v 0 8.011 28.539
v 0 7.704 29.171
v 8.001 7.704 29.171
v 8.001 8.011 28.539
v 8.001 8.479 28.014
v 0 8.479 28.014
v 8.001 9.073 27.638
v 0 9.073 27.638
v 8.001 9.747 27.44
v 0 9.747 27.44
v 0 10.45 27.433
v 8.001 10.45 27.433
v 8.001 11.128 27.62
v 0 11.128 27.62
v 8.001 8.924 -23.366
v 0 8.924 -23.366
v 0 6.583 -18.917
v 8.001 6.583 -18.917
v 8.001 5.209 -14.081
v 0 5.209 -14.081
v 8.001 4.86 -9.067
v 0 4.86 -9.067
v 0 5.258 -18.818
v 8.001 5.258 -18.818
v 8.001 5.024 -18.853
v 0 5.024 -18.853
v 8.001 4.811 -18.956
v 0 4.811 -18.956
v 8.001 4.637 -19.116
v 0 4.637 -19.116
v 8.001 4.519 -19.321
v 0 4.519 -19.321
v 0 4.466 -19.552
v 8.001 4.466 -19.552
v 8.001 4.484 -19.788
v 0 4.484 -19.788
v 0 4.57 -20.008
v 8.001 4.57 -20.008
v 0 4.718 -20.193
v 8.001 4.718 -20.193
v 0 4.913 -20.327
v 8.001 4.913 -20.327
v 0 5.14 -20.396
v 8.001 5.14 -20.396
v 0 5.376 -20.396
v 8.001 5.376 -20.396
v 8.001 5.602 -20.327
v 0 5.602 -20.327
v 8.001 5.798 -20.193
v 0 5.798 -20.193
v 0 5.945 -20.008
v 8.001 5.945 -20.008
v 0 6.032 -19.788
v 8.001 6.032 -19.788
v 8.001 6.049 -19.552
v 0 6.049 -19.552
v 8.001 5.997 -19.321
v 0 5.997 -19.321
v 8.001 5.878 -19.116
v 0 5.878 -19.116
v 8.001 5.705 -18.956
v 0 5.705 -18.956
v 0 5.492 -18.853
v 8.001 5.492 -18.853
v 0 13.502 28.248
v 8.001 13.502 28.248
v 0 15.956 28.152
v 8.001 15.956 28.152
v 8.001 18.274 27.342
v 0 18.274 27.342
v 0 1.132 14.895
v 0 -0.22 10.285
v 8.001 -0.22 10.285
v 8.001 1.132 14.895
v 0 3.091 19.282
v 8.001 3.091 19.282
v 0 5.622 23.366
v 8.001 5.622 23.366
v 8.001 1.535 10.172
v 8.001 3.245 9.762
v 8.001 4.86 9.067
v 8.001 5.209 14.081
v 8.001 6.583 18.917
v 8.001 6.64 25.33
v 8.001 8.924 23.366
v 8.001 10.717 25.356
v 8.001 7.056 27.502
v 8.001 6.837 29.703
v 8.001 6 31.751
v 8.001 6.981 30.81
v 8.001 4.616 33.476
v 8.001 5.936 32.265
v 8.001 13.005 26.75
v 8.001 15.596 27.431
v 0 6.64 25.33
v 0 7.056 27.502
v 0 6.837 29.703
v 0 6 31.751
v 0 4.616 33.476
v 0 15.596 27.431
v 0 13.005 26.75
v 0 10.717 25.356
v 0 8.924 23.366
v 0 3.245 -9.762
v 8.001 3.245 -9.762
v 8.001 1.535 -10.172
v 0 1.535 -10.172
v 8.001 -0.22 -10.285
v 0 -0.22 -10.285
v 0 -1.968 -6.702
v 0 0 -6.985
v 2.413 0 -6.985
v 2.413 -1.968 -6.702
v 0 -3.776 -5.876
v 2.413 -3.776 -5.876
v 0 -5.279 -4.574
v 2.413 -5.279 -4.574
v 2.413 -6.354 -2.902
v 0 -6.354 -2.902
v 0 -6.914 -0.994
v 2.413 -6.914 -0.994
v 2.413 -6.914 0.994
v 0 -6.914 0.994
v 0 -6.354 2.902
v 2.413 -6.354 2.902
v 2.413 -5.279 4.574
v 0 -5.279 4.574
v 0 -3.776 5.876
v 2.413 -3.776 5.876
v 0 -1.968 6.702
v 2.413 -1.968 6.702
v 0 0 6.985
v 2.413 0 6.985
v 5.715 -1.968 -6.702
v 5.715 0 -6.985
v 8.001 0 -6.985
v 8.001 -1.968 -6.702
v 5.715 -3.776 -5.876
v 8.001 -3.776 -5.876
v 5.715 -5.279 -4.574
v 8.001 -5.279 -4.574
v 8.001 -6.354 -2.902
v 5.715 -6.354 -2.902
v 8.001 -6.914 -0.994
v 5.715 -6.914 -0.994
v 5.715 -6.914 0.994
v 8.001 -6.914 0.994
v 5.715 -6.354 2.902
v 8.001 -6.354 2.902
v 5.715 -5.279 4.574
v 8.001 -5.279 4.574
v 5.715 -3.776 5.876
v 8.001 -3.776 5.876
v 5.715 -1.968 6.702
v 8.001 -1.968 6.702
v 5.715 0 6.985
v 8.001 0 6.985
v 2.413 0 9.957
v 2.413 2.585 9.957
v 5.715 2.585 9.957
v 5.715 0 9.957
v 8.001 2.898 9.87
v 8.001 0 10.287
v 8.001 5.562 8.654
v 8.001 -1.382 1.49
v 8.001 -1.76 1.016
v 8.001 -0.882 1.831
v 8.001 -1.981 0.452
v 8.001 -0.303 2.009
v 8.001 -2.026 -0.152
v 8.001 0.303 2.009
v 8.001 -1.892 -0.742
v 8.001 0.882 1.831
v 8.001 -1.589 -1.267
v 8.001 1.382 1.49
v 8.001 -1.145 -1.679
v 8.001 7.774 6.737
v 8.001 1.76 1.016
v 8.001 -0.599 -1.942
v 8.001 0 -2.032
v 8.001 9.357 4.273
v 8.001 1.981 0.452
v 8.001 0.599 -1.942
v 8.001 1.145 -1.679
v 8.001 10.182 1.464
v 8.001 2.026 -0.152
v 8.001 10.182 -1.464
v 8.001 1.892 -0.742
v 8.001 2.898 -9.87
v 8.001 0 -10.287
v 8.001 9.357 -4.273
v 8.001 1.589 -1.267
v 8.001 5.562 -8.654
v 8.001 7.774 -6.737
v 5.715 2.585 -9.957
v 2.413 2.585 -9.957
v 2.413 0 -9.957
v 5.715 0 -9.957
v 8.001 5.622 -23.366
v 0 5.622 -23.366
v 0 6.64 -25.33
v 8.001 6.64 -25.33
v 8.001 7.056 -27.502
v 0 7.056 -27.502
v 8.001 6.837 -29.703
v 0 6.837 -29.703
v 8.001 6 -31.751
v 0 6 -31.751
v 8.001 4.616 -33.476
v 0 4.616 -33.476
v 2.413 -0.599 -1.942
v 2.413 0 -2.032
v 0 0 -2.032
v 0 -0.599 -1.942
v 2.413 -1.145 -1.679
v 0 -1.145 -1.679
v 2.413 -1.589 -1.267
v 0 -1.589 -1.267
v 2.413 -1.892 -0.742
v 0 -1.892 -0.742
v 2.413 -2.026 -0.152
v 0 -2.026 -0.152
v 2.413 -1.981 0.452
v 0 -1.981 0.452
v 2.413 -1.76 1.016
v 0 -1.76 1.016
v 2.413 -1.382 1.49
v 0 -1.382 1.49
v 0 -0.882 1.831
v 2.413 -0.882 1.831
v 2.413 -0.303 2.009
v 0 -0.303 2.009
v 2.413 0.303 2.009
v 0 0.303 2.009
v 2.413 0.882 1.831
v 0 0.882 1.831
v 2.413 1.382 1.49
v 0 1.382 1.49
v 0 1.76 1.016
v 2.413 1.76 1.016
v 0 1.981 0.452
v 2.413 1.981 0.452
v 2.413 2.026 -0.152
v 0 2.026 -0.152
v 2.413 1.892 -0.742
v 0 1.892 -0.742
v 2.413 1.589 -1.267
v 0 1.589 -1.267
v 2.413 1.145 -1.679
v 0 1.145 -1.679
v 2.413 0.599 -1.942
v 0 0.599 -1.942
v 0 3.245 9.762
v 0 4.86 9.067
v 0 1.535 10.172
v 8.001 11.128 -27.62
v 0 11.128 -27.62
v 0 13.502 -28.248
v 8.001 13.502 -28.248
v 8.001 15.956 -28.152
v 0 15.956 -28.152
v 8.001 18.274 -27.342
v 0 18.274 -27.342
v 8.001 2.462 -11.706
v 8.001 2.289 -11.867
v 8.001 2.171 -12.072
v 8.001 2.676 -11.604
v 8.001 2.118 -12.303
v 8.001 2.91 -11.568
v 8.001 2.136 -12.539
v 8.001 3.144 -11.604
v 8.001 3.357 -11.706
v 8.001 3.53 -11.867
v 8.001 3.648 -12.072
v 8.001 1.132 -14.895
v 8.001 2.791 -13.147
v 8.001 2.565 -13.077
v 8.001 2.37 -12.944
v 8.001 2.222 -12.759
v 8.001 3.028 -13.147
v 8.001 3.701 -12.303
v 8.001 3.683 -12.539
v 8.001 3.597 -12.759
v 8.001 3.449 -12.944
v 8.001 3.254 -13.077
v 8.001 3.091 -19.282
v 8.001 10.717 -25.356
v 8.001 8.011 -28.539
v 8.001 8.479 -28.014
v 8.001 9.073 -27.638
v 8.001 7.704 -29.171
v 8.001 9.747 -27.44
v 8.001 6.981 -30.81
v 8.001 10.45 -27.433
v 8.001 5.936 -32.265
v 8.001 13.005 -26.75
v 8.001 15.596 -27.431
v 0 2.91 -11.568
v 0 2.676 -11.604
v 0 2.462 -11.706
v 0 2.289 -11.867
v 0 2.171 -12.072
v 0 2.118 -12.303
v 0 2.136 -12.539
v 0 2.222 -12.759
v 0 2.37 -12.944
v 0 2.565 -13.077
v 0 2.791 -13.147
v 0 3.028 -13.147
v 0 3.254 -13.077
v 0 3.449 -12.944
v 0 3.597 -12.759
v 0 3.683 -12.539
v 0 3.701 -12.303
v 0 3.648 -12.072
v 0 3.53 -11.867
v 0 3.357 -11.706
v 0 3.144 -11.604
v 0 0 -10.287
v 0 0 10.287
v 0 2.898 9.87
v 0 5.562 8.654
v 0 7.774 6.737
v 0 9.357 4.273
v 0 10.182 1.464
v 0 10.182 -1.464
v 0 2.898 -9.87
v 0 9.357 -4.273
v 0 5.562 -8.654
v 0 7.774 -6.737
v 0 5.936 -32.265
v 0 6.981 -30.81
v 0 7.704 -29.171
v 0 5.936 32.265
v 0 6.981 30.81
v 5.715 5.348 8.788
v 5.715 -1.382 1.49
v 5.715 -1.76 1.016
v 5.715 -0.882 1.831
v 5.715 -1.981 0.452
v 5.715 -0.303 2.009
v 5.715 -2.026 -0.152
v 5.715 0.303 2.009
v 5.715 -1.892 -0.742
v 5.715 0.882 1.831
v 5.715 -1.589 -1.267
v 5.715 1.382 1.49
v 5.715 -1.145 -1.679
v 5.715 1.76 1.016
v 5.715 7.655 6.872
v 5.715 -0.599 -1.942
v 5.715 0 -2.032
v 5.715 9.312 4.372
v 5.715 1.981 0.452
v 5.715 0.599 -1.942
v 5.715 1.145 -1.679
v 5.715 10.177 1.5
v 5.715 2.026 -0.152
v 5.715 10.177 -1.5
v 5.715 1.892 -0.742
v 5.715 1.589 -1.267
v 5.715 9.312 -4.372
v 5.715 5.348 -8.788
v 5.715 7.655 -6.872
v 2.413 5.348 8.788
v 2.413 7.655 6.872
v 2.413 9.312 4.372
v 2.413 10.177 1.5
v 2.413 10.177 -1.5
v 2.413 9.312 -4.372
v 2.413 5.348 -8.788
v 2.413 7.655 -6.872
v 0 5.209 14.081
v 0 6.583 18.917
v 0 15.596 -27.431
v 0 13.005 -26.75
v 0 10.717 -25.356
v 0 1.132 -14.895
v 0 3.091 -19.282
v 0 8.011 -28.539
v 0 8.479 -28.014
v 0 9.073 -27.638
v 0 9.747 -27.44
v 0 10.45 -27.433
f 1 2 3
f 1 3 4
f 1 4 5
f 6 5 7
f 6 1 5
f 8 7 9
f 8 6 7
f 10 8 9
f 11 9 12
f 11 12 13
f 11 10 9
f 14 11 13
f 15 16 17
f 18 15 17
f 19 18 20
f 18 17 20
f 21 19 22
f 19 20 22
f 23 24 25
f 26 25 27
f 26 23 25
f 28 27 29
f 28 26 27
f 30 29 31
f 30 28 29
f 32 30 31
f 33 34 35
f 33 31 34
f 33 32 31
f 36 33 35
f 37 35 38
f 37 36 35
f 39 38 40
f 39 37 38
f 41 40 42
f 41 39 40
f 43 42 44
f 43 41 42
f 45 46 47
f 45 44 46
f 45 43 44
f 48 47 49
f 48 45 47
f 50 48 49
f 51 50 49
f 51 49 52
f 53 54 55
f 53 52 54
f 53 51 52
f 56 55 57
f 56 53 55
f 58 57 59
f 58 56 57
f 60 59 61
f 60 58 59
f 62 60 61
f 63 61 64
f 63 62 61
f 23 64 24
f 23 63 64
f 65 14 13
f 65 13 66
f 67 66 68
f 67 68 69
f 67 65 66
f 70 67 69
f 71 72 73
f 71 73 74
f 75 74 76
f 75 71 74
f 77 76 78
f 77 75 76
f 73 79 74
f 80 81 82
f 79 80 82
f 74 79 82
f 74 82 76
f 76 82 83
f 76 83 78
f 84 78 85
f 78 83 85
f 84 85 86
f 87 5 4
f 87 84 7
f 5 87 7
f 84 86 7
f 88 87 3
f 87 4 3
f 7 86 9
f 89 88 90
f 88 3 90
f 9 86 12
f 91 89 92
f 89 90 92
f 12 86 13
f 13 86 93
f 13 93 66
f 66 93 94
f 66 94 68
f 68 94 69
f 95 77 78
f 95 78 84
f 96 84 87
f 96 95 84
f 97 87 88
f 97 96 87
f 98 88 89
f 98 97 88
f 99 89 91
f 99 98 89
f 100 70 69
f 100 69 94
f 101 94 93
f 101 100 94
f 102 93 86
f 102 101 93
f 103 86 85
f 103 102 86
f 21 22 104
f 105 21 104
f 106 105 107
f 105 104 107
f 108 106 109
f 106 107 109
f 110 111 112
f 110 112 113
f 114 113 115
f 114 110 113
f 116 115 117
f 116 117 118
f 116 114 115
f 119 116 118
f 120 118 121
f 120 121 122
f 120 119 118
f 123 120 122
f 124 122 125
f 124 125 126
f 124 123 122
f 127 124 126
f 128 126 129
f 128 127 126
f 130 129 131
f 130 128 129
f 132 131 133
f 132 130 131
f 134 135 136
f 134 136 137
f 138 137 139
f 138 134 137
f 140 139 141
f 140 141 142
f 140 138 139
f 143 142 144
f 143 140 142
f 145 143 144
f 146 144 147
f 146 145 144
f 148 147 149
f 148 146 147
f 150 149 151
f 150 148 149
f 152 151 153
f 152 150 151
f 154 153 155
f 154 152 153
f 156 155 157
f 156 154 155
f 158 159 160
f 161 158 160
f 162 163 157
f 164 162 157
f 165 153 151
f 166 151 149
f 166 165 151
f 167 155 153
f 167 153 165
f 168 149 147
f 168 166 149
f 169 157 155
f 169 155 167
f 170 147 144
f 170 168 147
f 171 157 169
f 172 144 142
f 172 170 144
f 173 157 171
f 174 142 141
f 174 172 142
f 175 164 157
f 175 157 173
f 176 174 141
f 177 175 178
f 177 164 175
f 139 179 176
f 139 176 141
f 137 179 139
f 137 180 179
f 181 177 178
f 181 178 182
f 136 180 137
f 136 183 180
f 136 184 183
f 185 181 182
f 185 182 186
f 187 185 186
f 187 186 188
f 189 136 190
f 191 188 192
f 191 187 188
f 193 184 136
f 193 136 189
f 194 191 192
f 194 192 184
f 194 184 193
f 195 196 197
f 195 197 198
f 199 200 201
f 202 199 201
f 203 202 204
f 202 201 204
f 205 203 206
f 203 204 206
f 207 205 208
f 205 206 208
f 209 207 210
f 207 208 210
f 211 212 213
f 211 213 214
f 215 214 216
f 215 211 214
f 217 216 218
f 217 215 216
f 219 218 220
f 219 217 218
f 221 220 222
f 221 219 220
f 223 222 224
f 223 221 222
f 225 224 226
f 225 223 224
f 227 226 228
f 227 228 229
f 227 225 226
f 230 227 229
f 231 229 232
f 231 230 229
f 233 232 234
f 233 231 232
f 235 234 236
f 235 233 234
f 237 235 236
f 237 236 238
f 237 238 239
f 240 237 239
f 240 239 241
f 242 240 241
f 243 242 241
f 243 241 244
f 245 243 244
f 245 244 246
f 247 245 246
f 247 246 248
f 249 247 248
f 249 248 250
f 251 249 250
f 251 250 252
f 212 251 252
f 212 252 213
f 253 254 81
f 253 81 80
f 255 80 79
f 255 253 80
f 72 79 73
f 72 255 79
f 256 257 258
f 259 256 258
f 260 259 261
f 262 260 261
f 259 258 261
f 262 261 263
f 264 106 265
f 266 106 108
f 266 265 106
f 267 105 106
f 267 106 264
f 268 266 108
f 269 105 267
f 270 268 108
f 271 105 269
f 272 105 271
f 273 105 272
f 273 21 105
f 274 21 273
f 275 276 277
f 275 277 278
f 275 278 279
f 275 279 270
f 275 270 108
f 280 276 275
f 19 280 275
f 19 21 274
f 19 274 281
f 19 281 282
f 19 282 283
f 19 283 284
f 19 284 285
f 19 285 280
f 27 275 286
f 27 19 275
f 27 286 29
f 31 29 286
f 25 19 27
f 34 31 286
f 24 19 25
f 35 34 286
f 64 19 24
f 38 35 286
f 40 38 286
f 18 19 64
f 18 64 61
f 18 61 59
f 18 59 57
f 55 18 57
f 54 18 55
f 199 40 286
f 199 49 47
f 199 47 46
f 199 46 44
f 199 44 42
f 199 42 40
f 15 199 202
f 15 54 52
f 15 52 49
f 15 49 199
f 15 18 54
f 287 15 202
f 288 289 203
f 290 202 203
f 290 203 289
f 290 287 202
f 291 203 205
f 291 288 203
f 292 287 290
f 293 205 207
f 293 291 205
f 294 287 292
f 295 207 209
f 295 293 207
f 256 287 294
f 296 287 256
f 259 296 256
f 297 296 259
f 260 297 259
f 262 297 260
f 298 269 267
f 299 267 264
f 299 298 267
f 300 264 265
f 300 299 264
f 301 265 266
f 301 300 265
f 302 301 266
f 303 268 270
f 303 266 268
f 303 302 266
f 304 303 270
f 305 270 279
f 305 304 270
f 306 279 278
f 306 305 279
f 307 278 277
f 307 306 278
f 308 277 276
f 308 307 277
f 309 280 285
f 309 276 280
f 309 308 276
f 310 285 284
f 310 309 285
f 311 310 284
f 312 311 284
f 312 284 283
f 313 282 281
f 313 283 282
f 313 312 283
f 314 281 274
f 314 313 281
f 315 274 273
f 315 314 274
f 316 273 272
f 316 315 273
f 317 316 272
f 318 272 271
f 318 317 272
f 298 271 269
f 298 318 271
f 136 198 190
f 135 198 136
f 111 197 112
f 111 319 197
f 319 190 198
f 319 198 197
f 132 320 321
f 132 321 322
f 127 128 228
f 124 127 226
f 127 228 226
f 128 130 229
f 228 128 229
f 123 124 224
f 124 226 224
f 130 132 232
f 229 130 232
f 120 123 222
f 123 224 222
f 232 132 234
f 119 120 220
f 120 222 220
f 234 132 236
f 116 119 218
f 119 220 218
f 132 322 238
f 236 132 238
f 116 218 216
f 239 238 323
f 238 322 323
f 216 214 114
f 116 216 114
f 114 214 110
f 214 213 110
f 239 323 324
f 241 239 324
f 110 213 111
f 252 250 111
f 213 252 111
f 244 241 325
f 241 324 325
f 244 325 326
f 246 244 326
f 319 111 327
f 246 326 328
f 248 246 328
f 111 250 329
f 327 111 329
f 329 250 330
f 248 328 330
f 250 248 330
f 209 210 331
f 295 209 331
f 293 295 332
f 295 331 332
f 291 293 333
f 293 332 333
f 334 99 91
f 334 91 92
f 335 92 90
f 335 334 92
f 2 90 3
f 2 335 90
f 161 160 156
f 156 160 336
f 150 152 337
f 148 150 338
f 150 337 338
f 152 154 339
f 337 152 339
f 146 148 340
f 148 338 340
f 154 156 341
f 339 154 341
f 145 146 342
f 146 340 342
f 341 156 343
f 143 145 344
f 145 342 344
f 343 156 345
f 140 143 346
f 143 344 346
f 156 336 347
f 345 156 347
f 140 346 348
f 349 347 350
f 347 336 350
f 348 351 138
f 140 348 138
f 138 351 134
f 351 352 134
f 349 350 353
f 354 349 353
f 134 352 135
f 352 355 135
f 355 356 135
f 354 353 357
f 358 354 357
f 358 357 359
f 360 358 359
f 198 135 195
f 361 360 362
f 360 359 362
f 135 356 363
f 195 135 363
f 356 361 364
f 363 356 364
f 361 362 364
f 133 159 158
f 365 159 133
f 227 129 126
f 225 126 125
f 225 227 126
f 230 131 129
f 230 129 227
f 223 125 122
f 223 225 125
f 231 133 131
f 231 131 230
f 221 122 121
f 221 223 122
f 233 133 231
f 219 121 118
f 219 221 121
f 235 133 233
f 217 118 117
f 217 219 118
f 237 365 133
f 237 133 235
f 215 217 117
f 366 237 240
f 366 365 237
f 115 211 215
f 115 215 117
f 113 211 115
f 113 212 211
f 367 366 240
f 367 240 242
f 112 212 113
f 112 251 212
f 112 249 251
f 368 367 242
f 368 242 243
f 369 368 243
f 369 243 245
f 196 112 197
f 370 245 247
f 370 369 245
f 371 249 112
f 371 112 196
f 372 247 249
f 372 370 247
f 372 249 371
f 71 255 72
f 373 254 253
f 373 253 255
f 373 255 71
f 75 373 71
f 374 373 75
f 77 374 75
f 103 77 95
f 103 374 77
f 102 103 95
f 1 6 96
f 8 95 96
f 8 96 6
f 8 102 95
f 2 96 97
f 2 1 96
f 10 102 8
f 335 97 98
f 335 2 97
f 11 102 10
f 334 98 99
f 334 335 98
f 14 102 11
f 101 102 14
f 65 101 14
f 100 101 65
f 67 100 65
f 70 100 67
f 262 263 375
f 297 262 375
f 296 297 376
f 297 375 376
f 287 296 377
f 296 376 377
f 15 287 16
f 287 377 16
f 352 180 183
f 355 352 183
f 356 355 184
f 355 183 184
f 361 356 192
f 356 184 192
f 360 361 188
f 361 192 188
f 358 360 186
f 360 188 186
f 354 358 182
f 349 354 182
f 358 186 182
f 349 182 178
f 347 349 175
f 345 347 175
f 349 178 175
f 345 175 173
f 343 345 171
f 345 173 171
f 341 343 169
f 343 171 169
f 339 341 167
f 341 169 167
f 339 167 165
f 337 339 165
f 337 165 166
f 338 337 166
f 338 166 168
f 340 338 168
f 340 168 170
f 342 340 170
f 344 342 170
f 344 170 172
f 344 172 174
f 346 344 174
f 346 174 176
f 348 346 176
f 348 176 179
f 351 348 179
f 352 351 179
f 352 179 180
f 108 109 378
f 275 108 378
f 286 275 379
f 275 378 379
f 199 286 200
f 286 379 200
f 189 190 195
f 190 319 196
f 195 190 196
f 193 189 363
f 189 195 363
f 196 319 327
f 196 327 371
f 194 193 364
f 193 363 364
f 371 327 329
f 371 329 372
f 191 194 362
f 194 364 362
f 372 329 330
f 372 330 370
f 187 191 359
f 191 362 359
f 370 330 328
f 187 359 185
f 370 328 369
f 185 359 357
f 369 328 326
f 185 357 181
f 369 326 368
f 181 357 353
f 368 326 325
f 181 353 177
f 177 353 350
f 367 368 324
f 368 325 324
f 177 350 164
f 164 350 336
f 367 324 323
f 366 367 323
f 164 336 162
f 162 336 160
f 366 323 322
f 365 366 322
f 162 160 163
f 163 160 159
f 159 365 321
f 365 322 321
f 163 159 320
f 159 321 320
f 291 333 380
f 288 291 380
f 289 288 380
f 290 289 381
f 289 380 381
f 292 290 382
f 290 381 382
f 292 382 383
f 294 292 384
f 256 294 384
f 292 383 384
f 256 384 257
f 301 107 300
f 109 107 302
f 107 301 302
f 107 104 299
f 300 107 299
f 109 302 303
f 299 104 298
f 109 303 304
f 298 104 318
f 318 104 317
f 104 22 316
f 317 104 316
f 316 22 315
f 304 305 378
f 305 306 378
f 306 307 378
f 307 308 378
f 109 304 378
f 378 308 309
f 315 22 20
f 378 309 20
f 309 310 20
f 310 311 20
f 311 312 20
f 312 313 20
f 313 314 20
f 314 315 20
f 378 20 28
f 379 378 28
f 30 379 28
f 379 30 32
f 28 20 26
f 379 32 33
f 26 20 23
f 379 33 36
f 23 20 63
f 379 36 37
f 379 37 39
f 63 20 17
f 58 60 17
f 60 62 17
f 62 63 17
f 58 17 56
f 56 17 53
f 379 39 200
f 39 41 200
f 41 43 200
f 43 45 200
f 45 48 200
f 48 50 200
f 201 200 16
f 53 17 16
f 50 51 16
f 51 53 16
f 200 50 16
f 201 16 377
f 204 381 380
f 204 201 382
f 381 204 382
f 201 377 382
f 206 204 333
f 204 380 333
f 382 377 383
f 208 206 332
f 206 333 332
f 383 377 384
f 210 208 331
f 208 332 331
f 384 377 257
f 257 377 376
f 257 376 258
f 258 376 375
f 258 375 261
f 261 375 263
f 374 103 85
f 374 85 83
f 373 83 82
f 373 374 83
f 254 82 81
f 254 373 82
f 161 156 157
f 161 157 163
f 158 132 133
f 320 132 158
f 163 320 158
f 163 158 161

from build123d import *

# Parameters (mm, degrees)
SKETCH1_R                               = 10.287
BOSS_EXTRUDE1_DEPTH                     = 8.001
SKETCH2_R                               = 2.032
CUT_EXTRUDE1_DEPTH                      = 3.7338
CUT_EXTRUDE2_START                      = -3.7338
SKETCH3_R                               = 2.032
CUT_EXTRUDE2_DEPTH                      = 3.7338
BOSS_EXTRUDE2_DEPTH                     = 8.001
CUT_EXTRUDE3_START                      = -8.001
CUT_EXTRUDE3_DEPTH                      = 8.001
SKETCH6_W                               = 3.302
SKETCH6_H                               = 19.9136
CUT_EXTRUDE4_DEPTH                      = 39.509209906
F_1_16_0_0625_DIAMETER_HOLE1_AT_2_COUNT = 2
F_1_16_0_0625_DIAMETER_HOLE1_AT_2_PITCH = 7.62


with BuildPart() as part:
    # Sketch1 → Boss-Extrude1 (new body)
    with BuildSketch(Plane(origin=(0, 0, 0), x_dir=(0, 0, -1), z_dir=(1, 0, 0))):
        Circle(SKETCH1_R)
    extrude(amount=BOSS_EXTRUDE1_DEPTH)

    # Sketch2 → Cut-Extrude1 (cut)
    with BuildSketch(Plane(origin=(8.001, 0, 0), x_dir=(0, 0, -1), z_dir=(1, 0, 0))):
        Circle(SKETCH2_R)
    extrude(amount=-CUT_EXTRUDE1_DEPTH, mode=Mode.SUBTRACT)

    # Sketch3 → Cut-Extrude2 (cut)
    with BuildSketch(Plane.ZY.offset(CUT_EXTRUDE2_START)):
        with Locations(Location((0, 0, 0), (0, 0, 180))):
            Circle(SKETCH3_R)
    extrude(amount=CUT_EXTRUDE2_DEPTH, mode=Mode.SUBTRACT)

    # Sketch5 → Cut-Extrude3 (cut)
    with BuildSketch(Plane(origin=(8.001, 0, 0), x_dir=(0, 0, -1), z_dir=(1, 0, 0)).offset(CUT_EXTRUDE3_START)):
        with BuildLine():
            Line((-6.985, 0), (-10.287, 0))
            ThreePointArc((-10.287, 0), (0, -10.287), (10.287, 0))
            Line((10.287, 0), (6.985, 0))
            ThreePointArc((6.985, 0), (0, -6.985), (-6.985, 0))
        make_face()
    extrude(amount=CUT_EXTRUDE3_DEPTH, mode=Mode.SUBTRACT)

    # Sketch6 → Cut-Extrude4 (cut, through all)
    with BuildSketch(Plane(origin=(0, 10.287, 0), x_dir=(1, 0, 0), z_dir=(0, 1, 0))):
        with Locations((4.064, 0)):
            Rectangle(SKETCH6_W, SKETCH6_H)
    extrude(amount=-CUT_EXTRUDE4_DEPTH, mode=Mode.SUBTRACT)


with BuildPart() as body_2:
    # Sketch4 → Boss-Extrude2 (new body)
    with BuildSketch(Plane.ZY):
        with BuildLine():
            ThreePointArc((9.066535783, 4.860071799), (10.003433712, 2.398683591), (10.284648783, -0.219928201))
            ThreePointArc((10.284648783, -0.219928201), (17.121583704, 2.037315344), (23.365648783, 5.622071799))
            ThreePointArc((23.365648783, 5.622071799), (28.610506662, 7.025976389), (33.475681659, 4.615674643))
            ThreePointArc((33.475681659, 4.615674643), (31.564768671, 6.496206487), (29.171267322, 7.704155061))
            ThreePointArc((29.171267322, 7.704155061), (27.638389928, 9.072717296), (27.619726913, 11.127547555))
            ThreePointArc((27.619726913, 11.127547555), (28.291483716, 14.73214833), (27.341838119, 18.273698442))
            ThreePointArc((27.341838119, 18.273698442), (26.750112425, 13.005040292), (23.365648783, 8.924071799))
            ThreePointArc((23.365648783, 8.924071799), (16.53490074, 5.770349813), (9.066535783, 4.860071799))
        make_face()
    extrude(amount=-BOSS_EXTRUDE2_DEPTH)


with BuildPart() as body_3:
    # Mirror3: mirrored copy
    add(body_2.part.mirror(Plane.XY))

    # Sketch9 → 1/16 (0.0625) Diameter Hole1 (revolve, cut)
    with BuildSketch(Plane(origin=(0, 2.909568803, -12.362217009), x_dir=(0, 0, 1), z_dir=(0, 1, 0))):
        Polygon((0, 0), (0, 70.580933116), (0.79375, 70.104), (0.79375, 0), align=None)
    f_1_16_0_0625_diameter_hole1 = revolve(axis=Axis((-6.35, 2.909568803, -12.362217009), (1, 0, 0)), mode=Mode.SUBTRACT)

    # 1/16 (0.0625) Diameter Hole1 at 2: 1/16 (0.0625) Diameter Hole1 ×2
    with Locations(*[Vector(0, 0.30816938901422175, -0.9513315025135041) * (i * F_1_16_0_0625_DIAMETER_HOLE1_AT_2_PITCH) for i in range(1, F_1_16_0_0625_DIAMETER_HOLE1_AT_2_COUNT)]):
        add(f_1_16_0_0625_diameter_hole1, mode=Mode.SUBTRACT)


solid = Compound([part.part, body_2.part, body_3.part])
